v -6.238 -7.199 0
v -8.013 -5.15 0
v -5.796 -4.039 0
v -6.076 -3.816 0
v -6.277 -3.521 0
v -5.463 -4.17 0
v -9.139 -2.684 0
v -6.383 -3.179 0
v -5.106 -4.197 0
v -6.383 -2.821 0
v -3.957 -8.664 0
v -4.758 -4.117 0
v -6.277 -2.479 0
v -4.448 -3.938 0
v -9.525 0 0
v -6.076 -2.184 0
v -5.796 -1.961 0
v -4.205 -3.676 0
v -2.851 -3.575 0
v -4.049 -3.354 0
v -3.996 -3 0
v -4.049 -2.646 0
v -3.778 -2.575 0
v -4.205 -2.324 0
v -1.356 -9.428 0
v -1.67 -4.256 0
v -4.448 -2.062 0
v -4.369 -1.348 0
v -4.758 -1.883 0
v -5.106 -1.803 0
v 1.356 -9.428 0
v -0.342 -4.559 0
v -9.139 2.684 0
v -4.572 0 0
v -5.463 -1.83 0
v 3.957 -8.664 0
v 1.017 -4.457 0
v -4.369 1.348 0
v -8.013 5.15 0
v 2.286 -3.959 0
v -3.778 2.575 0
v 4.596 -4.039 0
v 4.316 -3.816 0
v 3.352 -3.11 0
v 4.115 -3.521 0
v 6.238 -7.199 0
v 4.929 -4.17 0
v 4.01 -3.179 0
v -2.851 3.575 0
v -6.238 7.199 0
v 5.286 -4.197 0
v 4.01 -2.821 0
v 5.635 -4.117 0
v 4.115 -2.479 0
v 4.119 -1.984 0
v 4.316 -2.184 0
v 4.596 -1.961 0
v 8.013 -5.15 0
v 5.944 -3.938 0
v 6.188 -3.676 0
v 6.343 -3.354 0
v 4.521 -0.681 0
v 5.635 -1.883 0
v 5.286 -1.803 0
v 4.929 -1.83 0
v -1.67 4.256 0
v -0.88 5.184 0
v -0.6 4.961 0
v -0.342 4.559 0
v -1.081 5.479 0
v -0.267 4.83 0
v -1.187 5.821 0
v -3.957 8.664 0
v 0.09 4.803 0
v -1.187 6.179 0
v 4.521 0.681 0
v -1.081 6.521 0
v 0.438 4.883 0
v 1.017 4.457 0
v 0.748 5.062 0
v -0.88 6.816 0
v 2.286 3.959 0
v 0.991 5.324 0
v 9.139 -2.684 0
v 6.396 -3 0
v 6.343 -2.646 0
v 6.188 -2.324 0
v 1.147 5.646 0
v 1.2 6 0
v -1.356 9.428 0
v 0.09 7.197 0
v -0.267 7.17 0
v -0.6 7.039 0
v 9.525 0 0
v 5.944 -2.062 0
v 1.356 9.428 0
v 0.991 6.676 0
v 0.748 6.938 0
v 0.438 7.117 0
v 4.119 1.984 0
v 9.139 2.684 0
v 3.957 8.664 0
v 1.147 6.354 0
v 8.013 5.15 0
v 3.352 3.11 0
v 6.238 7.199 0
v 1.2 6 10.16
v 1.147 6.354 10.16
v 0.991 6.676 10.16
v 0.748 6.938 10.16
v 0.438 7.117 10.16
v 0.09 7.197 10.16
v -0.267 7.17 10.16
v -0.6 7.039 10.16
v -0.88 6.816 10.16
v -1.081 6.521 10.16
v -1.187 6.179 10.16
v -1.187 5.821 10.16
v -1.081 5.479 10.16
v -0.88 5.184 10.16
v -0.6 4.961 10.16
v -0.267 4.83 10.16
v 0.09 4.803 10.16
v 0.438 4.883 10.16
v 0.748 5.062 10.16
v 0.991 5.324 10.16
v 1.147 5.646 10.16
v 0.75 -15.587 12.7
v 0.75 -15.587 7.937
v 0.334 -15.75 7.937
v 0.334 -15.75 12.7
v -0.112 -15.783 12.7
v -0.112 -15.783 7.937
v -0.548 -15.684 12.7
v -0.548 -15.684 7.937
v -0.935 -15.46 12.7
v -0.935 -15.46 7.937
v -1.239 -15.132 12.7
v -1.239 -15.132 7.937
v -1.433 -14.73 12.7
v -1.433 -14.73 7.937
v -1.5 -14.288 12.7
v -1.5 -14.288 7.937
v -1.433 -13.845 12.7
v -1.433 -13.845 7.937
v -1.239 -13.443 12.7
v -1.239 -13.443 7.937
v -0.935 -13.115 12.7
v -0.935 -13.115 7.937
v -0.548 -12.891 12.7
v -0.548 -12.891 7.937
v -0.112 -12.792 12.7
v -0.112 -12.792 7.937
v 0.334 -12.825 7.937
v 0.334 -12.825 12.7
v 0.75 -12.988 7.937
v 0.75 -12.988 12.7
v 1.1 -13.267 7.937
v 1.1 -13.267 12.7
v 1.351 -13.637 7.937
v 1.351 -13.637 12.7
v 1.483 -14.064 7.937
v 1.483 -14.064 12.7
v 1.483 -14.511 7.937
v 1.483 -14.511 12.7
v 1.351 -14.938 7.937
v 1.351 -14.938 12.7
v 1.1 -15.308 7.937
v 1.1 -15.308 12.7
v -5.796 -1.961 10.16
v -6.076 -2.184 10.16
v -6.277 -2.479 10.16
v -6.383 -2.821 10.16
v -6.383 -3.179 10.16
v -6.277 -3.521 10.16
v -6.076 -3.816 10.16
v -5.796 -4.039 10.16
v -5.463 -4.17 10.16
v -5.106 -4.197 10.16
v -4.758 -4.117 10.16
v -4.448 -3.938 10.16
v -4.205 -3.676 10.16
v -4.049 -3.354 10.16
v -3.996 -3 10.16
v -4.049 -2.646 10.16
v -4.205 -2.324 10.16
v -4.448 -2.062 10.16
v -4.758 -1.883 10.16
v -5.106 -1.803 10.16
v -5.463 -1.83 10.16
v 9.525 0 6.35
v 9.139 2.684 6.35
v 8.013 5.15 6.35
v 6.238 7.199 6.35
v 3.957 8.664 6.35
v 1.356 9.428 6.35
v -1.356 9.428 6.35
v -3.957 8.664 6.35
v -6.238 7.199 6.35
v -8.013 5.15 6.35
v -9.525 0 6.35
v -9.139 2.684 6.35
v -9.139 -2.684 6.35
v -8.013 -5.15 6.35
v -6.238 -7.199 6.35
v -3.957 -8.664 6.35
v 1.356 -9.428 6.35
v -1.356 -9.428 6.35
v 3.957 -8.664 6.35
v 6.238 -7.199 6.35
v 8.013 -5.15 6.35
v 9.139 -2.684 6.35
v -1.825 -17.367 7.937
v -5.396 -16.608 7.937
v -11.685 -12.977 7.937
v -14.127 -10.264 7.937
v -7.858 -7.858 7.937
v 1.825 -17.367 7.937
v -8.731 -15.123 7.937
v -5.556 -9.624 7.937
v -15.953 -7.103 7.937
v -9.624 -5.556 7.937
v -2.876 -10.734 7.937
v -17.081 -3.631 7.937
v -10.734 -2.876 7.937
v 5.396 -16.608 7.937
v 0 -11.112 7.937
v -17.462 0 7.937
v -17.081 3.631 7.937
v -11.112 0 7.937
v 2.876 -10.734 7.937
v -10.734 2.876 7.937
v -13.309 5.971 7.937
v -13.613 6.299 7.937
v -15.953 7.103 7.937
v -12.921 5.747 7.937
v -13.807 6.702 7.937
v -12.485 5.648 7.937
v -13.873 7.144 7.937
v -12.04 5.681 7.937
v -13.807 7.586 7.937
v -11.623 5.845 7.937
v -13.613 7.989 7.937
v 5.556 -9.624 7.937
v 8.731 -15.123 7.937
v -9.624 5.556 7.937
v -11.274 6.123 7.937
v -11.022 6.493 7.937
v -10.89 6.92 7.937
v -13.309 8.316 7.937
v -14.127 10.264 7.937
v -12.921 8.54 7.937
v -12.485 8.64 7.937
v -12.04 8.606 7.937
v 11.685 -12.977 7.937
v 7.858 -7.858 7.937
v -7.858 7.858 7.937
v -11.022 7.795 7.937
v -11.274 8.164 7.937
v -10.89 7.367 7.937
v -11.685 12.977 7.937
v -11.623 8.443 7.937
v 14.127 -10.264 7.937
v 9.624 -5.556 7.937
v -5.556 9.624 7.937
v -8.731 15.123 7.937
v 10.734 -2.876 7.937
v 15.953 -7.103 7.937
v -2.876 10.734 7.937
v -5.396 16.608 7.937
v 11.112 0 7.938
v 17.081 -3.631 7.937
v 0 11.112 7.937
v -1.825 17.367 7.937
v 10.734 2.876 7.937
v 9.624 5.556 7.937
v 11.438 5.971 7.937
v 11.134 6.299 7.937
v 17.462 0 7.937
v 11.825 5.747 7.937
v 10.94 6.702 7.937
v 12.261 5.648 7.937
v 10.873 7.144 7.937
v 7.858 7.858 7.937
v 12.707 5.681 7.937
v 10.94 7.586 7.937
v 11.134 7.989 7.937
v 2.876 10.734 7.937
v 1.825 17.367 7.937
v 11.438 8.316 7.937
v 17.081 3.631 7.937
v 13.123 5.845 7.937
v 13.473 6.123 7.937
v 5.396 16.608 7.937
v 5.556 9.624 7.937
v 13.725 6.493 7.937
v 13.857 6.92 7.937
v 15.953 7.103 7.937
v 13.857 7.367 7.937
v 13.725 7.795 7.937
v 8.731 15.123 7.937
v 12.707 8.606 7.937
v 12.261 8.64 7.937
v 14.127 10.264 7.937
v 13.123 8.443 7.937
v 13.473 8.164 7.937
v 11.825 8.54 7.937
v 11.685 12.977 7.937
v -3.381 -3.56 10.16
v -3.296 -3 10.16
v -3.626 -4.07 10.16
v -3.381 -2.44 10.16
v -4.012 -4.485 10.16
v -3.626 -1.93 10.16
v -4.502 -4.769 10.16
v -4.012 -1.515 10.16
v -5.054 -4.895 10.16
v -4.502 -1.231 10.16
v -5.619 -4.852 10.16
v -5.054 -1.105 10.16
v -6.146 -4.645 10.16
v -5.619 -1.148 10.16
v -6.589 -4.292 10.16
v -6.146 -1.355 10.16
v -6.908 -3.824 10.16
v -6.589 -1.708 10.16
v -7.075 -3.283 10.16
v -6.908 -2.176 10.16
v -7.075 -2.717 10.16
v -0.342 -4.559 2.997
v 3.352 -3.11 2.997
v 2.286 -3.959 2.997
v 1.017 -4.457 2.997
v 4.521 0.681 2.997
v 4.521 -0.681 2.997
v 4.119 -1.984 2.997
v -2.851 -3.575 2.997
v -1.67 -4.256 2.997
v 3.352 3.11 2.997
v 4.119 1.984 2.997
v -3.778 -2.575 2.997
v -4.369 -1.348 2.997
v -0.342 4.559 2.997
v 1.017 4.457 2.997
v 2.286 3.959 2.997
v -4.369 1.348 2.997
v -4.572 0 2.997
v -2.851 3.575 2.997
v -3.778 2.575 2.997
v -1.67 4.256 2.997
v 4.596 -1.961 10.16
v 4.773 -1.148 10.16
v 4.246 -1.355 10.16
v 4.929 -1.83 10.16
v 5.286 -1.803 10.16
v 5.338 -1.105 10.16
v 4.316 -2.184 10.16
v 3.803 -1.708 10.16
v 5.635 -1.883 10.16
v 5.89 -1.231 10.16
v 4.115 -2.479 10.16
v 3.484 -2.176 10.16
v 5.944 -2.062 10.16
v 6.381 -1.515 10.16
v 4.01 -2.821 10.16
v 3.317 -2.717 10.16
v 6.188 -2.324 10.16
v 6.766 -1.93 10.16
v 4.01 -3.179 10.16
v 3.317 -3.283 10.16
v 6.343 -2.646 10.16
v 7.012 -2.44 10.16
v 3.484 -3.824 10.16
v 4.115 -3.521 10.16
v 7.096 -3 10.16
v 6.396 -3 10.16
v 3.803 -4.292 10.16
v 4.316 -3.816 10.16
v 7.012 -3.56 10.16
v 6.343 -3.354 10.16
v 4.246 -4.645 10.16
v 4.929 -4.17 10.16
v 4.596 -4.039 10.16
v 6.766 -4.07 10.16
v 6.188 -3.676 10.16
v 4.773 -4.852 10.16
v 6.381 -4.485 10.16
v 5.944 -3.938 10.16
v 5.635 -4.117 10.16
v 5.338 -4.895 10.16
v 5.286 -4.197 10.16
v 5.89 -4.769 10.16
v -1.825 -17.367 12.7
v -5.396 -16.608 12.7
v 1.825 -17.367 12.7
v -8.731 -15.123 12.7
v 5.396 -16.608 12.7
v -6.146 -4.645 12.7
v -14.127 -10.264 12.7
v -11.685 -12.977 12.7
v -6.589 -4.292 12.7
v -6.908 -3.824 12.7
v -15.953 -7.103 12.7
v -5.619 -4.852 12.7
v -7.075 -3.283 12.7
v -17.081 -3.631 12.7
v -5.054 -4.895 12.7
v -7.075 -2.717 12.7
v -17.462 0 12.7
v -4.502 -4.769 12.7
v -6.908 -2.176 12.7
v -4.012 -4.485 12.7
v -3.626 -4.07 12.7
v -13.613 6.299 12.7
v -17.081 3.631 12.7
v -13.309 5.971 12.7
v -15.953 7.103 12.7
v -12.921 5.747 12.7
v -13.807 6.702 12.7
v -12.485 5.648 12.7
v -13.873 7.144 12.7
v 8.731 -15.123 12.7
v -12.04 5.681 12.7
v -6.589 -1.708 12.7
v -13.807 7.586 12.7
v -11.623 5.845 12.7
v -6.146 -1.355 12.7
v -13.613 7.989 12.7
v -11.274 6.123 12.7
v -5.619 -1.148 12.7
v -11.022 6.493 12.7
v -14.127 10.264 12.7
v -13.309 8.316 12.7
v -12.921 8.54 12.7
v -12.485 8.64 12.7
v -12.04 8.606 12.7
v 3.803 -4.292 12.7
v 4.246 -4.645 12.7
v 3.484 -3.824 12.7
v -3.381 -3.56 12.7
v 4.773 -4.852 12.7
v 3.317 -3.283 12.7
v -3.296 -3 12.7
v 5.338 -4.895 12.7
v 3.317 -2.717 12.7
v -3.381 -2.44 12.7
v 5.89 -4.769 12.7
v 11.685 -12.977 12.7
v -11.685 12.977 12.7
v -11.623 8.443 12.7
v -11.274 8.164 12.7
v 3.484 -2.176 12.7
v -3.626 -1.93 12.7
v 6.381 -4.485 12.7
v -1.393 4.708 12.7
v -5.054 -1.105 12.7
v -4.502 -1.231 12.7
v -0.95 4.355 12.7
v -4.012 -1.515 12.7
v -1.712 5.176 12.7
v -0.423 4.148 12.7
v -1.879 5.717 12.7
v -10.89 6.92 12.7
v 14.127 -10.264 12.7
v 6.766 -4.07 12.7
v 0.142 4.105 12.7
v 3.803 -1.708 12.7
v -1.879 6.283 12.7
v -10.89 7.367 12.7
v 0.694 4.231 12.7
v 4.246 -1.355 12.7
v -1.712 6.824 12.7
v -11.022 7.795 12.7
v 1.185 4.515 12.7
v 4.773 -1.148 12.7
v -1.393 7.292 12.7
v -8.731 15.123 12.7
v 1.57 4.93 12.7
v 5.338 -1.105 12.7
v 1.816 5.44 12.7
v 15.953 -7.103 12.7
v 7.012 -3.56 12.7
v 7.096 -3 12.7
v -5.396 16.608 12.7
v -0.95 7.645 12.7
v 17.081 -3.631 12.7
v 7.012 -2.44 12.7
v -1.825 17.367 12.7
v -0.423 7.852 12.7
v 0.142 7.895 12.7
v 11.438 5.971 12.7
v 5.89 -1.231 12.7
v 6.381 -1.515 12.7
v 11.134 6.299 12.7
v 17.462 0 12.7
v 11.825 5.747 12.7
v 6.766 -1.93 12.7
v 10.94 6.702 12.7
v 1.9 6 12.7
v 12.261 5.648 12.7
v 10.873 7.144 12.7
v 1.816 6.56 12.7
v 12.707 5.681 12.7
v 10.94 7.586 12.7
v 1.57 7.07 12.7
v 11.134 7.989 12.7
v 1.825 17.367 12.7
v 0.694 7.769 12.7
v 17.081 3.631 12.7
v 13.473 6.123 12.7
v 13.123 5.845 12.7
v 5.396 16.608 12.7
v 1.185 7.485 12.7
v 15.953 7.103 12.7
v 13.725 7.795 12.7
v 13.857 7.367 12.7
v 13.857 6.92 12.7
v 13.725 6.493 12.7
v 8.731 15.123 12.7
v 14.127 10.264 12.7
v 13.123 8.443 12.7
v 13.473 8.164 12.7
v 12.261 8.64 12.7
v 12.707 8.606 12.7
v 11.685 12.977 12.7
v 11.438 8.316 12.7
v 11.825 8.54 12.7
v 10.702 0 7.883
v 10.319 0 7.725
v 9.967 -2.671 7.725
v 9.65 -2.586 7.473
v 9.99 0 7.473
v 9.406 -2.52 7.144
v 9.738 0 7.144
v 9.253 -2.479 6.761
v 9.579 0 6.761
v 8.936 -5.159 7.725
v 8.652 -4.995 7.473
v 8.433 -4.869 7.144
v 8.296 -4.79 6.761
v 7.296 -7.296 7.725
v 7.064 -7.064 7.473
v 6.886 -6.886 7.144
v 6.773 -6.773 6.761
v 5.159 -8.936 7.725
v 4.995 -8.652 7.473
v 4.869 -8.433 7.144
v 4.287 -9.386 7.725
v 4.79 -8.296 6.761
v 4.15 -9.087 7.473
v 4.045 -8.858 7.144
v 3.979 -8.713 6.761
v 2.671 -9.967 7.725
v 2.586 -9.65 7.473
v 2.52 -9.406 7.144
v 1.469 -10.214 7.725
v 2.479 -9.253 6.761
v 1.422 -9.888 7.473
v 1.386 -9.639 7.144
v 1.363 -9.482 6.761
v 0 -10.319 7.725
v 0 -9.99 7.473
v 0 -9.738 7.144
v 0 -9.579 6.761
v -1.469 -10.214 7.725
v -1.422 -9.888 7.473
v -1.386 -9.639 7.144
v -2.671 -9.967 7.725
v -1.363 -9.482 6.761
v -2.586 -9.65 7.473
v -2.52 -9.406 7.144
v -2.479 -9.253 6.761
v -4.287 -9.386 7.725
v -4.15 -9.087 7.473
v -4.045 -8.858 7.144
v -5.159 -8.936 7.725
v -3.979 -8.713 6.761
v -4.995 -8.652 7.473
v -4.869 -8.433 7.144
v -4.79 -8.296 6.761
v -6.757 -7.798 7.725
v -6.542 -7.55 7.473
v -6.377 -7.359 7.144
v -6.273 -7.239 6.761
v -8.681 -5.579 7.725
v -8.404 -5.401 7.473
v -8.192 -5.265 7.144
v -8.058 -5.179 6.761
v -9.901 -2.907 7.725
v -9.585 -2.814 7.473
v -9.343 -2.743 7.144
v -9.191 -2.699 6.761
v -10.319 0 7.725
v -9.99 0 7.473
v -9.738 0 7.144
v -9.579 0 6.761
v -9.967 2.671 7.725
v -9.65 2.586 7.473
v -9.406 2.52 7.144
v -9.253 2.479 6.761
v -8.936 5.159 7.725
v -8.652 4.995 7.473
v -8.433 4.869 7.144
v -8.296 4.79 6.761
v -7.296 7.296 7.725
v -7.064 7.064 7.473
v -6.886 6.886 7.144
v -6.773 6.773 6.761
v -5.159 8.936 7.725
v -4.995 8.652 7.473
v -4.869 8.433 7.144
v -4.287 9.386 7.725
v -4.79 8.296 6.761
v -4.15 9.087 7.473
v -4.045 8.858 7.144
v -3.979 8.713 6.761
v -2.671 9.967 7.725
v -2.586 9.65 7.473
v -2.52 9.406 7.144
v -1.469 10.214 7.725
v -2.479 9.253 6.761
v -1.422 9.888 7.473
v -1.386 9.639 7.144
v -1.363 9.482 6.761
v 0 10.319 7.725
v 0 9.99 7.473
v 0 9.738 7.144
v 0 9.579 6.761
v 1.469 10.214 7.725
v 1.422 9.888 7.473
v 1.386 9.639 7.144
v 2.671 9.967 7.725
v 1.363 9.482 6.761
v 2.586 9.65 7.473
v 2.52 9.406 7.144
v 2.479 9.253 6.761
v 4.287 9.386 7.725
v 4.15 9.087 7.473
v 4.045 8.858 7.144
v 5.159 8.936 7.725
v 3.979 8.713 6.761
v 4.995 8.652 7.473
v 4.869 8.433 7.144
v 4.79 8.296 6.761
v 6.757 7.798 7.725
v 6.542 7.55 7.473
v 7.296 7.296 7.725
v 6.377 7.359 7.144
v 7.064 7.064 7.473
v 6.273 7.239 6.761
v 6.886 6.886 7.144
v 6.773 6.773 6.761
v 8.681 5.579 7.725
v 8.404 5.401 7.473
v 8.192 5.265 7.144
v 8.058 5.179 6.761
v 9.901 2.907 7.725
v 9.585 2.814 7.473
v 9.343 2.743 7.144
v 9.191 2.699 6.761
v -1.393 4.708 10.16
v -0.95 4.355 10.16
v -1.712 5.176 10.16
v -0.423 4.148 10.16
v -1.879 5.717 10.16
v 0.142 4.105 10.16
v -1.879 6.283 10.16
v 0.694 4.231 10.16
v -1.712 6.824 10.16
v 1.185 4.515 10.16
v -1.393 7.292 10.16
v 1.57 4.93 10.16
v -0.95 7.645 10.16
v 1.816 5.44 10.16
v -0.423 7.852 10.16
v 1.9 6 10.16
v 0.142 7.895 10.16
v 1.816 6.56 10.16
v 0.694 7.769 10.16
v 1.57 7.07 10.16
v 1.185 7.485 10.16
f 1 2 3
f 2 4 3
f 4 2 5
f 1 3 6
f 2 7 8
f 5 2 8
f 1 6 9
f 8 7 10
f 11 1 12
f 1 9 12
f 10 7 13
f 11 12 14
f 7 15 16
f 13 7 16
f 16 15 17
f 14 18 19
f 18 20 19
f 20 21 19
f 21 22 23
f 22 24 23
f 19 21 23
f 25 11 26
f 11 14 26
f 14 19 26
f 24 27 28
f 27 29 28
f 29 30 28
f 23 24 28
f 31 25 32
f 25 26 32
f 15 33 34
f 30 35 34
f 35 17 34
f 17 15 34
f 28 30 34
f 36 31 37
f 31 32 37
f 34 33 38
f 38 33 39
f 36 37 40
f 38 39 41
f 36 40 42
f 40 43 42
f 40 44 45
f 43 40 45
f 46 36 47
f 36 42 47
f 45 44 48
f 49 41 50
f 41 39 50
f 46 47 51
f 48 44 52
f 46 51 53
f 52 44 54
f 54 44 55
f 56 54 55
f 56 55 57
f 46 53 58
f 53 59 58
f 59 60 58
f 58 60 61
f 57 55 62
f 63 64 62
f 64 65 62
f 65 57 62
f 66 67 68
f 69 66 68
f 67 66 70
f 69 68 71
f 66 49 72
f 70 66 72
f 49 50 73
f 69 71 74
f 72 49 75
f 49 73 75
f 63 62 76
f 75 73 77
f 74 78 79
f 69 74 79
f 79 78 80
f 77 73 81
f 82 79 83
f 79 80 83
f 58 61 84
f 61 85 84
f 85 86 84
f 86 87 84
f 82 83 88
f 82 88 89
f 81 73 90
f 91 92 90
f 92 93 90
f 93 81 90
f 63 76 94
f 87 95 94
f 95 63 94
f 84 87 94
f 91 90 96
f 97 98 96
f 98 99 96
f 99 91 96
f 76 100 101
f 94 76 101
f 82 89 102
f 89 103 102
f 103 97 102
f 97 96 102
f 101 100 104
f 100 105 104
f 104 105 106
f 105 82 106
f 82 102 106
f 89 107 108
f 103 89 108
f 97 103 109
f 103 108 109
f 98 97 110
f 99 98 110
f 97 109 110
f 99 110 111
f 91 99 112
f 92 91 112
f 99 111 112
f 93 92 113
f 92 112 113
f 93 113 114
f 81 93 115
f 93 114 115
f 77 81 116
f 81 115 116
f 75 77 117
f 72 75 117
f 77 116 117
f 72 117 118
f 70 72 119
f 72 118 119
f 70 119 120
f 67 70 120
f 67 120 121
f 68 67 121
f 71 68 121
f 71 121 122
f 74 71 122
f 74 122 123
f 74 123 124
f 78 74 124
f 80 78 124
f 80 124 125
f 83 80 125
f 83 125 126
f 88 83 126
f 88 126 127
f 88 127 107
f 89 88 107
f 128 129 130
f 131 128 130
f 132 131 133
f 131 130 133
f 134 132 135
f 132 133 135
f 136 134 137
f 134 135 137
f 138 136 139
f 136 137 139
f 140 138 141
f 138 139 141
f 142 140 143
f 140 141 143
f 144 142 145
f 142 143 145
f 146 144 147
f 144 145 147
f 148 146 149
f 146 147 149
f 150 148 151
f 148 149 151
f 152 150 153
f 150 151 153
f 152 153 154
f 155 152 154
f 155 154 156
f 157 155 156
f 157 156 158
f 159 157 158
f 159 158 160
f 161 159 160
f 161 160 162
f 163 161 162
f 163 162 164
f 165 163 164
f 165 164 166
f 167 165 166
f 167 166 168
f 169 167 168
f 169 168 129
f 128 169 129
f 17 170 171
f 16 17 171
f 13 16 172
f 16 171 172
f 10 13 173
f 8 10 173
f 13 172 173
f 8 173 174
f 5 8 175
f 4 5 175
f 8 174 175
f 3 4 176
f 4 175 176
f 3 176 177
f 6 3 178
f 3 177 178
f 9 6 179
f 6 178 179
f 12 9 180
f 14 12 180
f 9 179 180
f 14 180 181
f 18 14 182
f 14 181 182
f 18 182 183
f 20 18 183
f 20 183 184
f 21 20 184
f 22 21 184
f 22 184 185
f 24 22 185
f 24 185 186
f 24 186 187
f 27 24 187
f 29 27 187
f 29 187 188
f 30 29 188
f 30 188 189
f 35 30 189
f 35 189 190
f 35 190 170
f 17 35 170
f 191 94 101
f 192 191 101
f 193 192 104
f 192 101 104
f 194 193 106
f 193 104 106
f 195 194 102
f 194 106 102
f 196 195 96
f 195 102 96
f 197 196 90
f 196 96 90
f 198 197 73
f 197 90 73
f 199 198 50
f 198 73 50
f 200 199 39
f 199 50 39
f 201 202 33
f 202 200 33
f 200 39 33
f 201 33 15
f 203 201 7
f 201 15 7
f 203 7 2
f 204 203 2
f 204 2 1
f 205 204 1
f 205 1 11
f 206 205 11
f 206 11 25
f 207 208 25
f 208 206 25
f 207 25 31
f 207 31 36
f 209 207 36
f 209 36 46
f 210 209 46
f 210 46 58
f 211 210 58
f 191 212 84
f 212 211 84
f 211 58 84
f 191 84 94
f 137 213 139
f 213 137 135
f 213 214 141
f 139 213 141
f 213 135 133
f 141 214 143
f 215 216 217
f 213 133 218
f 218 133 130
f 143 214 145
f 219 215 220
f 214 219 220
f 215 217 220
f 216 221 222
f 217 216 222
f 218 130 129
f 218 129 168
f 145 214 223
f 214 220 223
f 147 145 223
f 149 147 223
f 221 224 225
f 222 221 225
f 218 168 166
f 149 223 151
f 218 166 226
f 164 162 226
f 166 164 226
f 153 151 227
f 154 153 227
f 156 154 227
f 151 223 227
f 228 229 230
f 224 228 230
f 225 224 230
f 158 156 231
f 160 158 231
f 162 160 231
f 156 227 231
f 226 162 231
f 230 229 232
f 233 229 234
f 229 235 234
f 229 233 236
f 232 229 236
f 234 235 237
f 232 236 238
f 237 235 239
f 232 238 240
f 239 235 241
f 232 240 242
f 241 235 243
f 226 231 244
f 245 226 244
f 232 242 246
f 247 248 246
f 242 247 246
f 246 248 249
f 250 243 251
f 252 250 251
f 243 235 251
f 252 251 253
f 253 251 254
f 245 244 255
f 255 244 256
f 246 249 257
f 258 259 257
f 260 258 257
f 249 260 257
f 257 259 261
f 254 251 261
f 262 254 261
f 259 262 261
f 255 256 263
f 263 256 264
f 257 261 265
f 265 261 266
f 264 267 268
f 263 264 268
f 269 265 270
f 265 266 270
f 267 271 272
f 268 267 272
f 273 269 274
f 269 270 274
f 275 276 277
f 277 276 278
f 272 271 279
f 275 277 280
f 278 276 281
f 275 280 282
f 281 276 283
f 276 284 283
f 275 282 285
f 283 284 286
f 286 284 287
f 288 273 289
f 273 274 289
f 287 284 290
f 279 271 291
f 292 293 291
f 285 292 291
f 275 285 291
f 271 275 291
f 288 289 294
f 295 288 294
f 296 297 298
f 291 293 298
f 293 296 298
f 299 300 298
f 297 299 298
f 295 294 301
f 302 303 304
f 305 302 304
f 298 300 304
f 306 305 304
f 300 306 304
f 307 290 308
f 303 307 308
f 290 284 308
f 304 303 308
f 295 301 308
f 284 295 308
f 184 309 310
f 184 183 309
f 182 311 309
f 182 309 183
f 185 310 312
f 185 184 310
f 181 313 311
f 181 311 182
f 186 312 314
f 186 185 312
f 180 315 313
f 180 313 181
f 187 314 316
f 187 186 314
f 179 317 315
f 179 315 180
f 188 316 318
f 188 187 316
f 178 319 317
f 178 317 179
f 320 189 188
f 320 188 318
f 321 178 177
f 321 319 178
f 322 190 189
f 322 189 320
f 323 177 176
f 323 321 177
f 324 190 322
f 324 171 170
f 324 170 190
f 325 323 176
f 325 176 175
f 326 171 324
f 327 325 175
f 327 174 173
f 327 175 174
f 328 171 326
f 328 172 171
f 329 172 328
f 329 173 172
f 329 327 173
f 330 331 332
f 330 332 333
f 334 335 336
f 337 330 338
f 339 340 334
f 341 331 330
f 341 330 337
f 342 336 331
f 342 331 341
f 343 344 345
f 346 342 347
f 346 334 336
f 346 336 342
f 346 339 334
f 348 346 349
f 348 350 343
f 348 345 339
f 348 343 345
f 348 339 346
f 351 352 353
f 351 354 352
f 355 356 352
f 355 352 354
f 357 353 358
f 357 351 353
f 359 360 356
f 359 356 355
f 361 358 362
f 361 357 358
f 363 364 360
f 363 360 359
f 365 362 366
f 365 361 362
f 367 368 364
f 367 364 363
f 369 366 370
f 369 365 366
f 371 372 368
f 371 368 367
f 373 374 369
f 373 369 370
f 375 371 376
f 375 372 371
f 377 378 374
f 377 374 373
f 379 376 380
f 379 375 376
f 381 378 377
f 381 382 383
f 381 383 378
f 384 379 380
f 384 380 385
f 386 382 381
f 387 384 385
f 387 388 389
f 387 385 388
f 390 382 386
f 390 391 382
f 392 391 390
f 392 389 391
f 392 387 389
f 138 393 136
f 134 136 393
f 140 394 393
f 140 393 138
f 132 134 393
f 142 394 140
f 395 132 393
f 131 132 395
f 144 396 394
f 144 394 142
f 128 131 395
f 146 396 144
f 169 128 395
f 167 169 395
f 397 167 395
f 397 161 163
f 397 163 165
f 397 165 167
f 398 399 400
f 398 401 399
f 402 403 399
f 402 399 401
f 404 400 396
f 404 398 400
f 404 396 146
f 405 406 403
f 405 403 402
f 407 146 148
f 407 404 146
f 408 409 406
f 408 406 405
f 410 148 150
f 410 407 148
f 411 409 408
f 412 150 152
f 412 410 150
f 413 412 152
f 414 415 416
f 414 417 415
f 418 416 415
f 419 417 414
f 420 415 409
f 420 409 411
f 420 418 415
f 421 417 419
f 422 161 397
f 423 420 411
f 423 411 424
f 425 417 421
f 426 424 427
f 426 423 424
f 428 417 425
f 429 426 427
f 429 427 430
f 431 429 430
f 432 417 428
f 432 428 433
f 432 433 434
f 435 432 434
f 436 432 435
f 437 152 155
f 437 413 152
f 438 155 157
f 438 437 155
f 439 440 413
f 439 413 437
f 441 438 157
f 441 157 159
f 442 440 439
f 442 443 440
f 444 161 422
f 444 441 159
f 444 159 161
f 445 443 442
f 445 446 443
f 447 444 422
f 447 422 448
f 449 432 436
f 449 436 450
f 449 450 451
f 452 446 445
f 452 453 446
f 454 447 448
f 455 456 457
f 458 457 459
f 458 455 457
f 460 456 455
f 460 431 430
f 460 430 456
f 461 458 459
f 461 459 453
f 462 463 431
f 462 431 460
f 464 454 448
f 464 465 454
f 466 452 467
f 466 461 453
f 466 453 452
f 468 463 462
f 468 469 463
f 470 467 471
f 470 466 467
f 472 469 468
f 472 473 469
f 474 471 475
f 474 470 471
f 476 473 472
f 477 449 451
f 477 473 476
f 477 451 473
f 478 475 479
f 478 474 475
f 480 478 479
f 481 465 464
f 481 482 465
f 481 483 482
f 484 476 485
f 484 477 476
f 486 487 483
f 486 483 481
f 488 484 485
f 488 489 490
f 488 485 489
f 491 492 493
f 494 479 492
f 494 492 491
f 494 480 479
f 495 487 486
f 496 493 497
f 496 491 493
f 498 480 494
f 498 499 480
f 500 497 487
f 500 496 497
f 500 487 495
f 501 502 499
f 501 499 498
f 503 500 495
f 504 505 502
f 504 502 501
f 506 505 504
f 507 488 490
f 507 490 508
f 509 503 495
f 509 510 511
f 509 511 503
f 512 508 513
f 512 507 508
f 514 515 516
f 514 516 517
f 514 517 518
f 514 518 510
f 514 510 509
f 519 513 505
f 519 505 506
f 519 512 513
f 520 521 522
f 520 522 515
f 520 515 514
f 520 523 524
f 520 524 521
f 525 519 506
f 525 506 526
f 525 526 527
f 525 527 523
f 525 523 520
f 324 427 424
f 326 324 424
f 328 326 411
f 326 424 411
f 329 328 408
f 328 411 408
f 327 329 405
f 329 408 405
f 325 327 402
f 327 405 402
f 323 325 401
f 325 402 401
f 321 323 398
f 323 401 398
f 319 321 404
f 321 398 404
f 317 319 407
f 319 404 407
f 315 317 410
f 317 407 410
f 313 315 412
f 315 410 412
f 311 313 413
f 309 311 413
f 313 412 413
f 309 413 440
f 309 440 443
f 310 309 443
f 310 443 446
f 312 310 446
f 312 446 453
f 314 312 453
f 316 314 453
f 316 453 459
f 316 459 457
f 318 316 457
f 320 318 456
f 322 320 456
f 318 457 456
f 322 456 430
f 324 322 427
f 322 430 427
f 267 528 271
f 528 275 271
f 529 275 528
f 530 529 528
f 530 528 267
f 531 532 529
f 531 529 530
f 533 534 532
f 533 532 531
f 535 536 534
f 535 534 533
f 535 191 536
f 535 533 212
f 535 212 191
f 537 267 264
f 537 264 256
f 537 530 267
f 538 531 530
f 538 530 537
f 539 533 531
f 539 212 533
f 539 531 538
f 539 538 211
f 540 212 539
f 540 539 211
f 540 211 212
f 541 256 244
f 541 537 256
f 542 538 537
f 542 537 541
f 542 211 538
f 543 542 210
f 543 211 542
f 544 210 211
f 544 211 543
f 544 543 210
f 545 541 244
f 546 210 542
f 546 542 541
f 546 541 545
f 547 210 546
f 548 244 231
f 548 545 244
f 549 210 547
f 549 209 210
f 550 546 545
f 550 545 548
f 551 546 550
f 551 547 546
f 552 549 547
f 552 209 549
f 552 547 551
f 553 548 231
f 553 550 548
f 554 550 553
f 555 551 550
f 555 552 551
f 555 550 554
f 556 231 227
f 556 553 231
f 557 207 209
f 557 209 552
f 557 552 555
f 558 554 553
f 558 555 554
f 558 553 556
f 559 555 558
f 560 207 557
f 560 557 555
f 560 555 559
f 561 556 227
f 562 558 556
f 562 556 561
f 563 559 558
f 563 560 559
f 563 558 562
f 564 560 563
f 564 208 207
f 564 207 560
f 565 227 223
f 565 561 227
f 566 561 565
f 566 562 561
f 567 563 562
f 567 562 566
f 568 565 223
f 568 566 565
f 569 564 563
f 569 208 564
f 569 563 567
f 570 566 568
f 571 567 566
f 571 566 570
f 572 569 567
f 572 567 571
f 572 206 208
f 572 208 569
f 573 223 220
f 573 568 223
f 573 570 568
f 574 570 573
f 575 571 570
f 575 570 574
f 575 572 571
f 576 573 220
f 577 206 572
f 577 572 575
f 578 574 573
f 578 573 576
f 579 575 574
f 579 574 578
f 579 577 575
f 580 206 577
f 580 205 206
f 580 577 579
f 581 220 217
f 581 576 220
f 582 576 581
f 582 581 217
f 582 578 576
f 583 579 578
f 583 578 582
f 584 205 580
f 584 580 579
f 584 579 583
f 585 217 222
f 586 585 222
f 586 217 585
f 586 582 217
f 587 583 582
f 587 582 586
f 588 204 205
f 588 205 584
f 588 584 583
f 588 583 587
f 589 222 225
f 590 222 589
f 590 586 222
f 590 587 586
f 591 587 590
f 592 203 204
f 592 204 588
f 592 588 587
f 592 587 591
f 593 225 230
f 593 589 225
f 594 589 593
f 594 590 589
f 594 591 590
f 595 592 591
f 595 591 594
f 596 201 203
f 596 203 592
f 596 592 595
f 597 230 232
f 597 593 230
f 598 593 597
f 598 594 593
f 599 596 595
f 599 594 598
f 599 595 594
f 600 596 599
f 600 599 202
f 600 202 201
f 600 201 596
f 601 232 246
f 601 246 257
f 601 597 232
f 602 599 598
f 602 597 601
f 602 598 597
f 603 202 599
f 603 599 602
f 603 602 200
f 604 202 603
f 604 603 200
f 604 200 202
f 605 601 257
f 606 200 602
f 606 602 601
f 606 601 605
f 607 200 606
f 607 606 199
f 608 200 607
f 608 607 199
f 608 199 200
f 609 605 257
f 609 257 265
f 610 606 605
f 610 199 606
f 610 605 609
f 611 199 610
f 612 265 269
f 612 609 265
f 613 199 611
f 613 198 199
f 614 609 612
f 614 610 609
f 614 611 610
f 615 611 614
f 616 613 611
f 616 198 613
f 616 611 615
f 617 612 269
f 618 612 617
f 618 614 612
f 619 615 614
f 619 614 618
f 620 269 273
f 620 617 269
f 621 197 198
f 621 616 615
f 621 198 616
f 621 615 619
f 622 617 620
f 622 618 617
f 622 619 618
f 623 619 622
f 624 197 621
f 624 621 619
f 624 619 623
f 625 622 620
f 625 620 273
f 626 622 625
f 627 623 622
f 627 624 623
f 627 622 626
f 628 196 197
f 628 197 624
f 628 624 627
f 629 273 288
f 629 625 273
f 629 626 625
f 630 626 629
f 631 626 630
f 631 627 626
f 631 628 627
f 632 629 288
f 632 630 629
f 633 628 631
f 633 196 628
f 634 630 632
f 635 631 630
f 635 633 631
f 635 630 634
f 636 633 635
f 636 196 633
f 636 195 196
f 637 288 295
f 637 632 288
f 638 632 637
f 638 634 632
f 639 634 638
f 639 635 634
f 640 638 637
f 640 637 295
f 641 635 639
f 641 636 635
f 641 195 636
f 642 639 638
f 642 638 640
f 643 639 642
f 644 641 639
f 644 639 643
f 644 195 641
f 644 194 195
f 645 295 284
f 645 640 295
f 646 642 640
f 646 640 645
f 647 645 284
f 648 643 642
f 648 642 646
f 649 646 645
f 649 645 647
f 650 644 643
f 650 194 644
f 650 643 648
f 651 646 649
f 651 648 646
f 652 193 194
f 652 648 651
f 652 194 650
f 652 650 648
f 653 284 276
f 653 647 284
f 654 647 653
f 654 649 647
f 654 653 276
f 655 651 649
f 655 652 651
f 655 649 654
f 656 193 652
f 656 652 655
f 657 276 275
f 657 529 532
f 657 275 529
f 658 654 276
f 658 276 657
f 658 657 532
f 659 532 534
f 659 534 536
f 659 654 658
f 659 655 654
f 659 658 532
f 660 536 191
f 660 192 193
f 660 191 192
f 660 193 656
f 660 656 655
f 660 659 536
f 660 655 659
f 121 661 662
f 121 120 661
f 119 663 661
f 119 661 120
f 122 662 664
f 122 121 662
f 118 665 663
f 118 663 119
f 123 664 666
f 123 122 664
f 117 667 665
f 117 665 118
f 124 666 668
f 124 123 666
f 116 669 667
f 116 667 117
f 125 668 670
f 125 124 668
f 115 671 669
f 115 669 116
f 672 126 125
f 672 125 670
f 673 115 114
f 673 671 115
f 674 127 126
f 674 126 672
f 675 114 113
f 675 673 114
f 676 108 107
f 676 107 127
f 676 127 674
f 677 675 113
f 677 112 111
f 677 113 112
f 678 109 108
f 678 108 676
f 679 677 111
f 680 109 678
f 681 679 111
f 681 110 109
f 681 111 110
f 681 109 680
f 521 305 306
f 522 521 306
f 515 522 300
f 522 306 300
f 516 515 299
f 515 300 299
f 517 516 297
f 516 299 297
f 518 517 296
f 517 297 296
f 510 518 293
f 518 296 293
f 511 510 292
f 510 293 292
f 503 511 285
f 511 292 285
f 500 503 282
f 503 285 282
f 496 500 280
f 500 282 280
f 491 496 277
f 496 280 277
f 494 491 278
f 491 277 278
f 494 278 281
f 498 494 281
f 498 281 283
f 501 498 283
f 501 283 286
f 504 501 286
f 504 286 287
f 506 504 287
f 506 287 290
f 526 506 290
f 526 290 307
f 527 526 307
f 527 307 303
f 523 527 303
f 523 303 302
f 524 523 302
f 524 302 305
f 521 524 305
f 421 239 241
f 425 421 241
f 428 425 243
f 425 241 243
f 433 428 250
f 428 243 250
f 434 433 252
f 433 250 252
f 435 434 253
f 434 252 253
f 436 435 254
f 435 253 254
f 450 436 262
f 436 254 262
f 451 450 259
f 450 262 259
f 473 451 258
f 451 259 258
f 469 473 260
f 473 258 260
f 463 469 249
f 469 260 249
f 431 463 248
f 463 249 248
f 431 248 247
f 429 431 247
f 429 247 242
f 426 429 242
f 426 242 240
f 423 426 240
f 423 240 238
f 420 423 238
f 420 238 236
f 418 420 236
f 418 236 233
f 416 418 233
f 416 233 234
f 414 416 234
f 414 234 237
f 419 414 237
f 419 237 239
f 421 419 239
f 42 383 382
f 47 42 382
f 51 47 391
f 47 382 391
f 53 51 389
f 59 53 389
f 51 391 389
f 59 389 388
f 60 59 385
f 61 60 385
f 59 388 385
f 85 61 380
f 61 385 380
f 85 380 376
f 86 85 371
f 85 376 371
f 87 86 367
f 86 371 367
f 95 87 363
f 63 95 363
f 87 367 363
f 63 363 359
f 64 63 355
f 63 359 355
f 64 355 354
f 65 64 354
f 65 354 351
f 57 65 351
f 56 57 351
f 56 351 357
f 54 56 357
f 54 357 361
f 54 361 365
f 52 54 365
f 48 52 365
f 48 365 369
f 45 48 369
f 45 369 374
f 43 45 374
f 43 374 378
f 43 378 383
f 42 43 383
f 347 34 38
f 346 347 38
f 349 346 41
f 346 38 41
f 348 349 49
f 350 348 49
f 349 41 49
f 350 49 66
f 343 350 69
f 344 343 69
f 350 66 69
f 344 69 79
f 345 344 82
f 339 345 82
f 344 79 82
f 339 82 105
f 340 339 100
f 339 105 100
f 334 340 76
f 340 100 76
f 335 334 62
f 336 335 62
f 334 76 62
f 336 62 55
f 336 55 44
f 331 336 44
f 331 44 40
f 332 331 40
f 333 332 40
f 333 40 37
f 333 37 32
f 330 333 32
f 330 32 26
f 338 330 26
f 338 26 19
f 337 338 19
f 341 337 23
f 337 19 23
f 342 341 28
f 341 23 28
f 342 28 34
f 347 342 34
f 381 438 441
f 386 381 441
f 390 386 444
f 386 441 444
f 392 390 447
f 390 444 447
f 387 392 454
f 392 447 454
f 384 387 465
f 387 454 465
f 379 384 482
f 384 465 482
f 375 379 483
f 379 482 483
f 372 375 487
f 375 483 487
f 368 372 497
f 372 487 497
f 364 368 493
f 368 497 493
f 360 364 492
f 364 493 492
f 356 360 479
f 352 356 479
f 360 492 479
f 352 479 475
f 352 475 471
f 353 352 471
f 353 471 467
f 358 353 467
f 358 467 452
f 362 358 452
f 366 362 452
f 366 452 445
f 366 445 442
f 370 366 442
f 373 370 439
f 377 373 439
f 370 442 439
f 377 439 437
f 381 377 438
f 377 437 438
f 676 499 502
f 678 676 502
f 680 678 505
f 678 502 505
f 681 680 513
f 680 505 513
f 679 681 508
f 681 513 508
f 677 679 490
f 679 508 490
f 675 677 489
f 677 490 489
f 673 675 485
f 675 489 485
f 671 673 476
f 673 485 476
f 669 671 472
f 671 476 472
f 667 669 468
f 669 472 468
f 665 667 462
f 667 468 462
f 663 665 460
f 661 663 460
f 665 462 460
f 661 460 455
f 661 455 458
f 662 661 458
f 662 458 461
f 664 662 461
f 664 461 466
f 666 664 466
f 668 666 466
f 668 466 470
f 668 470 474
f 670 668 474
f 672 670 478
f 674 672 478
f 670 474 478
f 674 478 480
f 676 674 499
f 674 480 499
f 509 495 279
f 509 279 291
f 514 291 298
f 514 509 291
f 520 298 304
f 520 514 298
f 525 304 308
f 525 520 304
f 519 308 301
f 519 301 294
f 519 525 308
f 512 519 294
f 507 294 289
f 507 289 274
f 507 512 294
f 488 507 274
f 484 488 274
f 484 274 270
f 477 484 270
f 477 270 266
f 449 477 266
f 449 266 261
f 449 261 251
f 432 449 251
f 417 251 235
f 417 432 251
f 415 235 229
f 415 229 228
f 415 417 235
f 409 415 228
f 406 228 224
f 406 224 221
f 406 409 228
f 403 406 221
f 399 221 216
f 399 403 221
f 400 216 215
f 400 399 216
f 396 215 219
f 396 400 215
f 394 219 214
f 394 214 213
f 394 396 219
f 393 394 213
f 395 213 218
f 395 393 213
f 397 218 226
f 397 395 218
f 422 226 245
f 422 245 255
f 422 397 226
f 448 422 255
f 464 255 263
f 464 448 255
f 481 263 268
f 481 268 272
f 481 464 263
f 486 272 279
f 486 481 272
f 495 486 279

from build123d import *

# Parameters (mm, degrees)
SKETCH1_R            = 9.525
BOSS_EXTRUDE1_DEPTH  = 12.7
SKETCH9_R            = 17.4625
BOSS_EXTRUDE2_DEPTH  = 4.7625
SKETCH2_R            = 4.572
CUT_EXTRUDE1_DEPTH   = 2.9972
M2_CLEARANCE_HOLE1_D = 2.4
SKETCH6_R            = 1.9
CUT_EXTRUDE2_DEPTH   = 2.54
SKETCH7_R            = 1.499997
CUT_EXTRUDE3_DEPTH   = 28.769908399
CIRPATTERN1_COUNT    = 3
CIRPATTERN2_COUNT    = 3
FILLET1_R            = 1.5875


with BuildPart() as part:
    # Sketch1 → Boss-Extrude1 (new body)
    with BuildSketch(Plane.XY):
        Circle(SKETCH1_R)
    extrude(amount=BOSS_EXTRUDE1_DEPTH)

    # Sketch9 → Boss-Extrude2 (add)
    with BuildSketch(Plane.XY.offset(12.7)):
        Circle(SKETCH9_R)
    extrude(amount=-BOSS_EXTRUDE2_DEPTH)

    # Sketch2 → Cut-Extrude1 (cut)
    with BuildSketch(Plane(origin=(0, 0, 0), x_dir=(-1, 0, 0), z_dir=(0, 0, -1))):
        Circle(SKETCH2_R)
    extrude(amount=-CUT_EXTRUDE1_DEPTH, mode=Mode.SUBTRACT)

    # M2 Clearance Hole1 (through all)
    with Locations(Plane(origin=(0, 0, 0), x_dir=(-1, 0, 0), z_dir=(0, 0, -1))):
        with Locations((0, 6.0000007)):
            m2_clearance_hole1 = Hole(M2_CLEARANCE_HOLE1_D / 2)

    # Sketch6 → Cut-Extrude2 (cut)
    with BuildSketch(Plane.XY.offset(12.7)):
        with Locations((0, 6.0000007)):
            Circle(SKETCH6_R)
    cut_extrude2 = extrude(amount=-CUT_EXTRUDE2_DEPTH, mode=Mode.SUBTRACT)

    # Sketch7 → Cut-Extrude3 (cut, through all)
    with BuildSketch(Plane(origin=(0, 0, 0), x_dir=(-1, 0, 0), z_dir=(0, 0, -1))):
        with Locations((12.373337957, 7.14375)):
            Circle(SKETCH7_R)
    cut_extrude3 = extrude(amount=-CUT_EXTRUDE3_DEPTH, mode=Mode.SUBTRACT)

    # CirPattern1: M2 Clearance Hole1, Cut-Extrude2 ×3 about axis
    cirpattern1_axis = Axis((0, 0, 0), (0, 0, 1))
    add([m2_clearance_hole1.rotate(cirpattern1_axis, i * 360 / CIRPATTERN1_COUNT) for i in range(1, CIRPATTERN1_COUNT)], mode=Mode.SUBTRACT)
    add([cut_extrude2.rotate(cirpattern1_axis, i * 360 / CIRPATTERN1_COUNT) for i in range(1, CIRPATTERN1_COUNT)], mode=Mode.SUBTRACT)

    # CirPattern2: Cut-Extrude3 ×3 about axis
    cirpattern2_axis = Axis((0, 0, 0), (0, 0, 1))
    for i in range(1, CIRPATTERN2_COUNT):
        add(cut_extrude3.rotate(cirpattern2_axis, i * 360 / CIRPATTERN2_COUNT), mode=Mode.SUBTRACT)

    # Fillet1
    fillet1_edges = [part.edges().sort_by_distance(p)[0] for p in [
        (-9.525, 0, 7.9375),
    ]]
    fillet(fillet1_edges, radius=FILLET1_R)


solid = part.part
